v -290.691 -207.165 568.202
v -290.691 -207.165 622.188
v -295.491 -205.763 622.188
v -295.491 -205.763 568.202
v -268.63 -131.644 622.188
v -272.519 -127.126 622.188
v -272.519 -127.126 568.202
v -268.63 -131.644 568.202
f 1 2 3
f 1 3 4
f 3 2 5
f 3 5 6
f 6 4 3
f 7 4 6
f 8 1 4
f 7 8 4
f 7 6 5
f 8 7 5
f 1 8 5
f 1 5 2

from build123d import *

# Parameters (mm, degrees)
BOSS_EXTRUDE1_DEPTH = 208.295833
SKETCH2_W           = 208.295833075
SKETCH2_H           = 125.616174383
CUT_EXTRUDE1_DEPTH  = 20
SKETCH3_R           = 77.5
CUT_EXTRUDE2_DEPTH  = 155.31


with BuildPart() as part:
    # Sketch1 → Boss-Extrude1 (new body)
    with BuildSketch(Plane.XY.offset(413.892285509)):
        Polygon((-272.519046524, -127.125849596), (-268.630033514, -131.644329993), (-324.842905159, -324.071500461), (-330.714338905, -326.339216919), align=None)
    extrude(amount=BOSS_EXTRUDE1_DEPTH)

    # Sketch2 → Cut-Extrude1 (cut)
    with BuildSketch(Plane(origin=(-212.075436587, 61.95263001, 0), x_dir=(0, 0, -1), z_dir=(0.959881544, -0.280405817, 0))):
        with Locations((-518.040202046, -343.17312855)):
            Rectangle(SKETCH2_W, SKETCH2_H)
    extrude(amount=-CUT_EXTRUDE1_DEPTH, mode=Mode.SUBTRACT)

    # Sketch3 → Cut-Extrude2 (cut, through all)
    with BuildSketch(Plane(origin=(0, 0, 568.202285509), x_dir=(-1, 0, 0), z_dir=(0, 0, -1))):
        with Locations((268.126479956, -164.060077585)):
            Circle(SKETCH3_R)
    extrude(amount=CUT_EXTRUDE2_DEPTH, mode=Mode.SUBTRACT)


solid = part.part
